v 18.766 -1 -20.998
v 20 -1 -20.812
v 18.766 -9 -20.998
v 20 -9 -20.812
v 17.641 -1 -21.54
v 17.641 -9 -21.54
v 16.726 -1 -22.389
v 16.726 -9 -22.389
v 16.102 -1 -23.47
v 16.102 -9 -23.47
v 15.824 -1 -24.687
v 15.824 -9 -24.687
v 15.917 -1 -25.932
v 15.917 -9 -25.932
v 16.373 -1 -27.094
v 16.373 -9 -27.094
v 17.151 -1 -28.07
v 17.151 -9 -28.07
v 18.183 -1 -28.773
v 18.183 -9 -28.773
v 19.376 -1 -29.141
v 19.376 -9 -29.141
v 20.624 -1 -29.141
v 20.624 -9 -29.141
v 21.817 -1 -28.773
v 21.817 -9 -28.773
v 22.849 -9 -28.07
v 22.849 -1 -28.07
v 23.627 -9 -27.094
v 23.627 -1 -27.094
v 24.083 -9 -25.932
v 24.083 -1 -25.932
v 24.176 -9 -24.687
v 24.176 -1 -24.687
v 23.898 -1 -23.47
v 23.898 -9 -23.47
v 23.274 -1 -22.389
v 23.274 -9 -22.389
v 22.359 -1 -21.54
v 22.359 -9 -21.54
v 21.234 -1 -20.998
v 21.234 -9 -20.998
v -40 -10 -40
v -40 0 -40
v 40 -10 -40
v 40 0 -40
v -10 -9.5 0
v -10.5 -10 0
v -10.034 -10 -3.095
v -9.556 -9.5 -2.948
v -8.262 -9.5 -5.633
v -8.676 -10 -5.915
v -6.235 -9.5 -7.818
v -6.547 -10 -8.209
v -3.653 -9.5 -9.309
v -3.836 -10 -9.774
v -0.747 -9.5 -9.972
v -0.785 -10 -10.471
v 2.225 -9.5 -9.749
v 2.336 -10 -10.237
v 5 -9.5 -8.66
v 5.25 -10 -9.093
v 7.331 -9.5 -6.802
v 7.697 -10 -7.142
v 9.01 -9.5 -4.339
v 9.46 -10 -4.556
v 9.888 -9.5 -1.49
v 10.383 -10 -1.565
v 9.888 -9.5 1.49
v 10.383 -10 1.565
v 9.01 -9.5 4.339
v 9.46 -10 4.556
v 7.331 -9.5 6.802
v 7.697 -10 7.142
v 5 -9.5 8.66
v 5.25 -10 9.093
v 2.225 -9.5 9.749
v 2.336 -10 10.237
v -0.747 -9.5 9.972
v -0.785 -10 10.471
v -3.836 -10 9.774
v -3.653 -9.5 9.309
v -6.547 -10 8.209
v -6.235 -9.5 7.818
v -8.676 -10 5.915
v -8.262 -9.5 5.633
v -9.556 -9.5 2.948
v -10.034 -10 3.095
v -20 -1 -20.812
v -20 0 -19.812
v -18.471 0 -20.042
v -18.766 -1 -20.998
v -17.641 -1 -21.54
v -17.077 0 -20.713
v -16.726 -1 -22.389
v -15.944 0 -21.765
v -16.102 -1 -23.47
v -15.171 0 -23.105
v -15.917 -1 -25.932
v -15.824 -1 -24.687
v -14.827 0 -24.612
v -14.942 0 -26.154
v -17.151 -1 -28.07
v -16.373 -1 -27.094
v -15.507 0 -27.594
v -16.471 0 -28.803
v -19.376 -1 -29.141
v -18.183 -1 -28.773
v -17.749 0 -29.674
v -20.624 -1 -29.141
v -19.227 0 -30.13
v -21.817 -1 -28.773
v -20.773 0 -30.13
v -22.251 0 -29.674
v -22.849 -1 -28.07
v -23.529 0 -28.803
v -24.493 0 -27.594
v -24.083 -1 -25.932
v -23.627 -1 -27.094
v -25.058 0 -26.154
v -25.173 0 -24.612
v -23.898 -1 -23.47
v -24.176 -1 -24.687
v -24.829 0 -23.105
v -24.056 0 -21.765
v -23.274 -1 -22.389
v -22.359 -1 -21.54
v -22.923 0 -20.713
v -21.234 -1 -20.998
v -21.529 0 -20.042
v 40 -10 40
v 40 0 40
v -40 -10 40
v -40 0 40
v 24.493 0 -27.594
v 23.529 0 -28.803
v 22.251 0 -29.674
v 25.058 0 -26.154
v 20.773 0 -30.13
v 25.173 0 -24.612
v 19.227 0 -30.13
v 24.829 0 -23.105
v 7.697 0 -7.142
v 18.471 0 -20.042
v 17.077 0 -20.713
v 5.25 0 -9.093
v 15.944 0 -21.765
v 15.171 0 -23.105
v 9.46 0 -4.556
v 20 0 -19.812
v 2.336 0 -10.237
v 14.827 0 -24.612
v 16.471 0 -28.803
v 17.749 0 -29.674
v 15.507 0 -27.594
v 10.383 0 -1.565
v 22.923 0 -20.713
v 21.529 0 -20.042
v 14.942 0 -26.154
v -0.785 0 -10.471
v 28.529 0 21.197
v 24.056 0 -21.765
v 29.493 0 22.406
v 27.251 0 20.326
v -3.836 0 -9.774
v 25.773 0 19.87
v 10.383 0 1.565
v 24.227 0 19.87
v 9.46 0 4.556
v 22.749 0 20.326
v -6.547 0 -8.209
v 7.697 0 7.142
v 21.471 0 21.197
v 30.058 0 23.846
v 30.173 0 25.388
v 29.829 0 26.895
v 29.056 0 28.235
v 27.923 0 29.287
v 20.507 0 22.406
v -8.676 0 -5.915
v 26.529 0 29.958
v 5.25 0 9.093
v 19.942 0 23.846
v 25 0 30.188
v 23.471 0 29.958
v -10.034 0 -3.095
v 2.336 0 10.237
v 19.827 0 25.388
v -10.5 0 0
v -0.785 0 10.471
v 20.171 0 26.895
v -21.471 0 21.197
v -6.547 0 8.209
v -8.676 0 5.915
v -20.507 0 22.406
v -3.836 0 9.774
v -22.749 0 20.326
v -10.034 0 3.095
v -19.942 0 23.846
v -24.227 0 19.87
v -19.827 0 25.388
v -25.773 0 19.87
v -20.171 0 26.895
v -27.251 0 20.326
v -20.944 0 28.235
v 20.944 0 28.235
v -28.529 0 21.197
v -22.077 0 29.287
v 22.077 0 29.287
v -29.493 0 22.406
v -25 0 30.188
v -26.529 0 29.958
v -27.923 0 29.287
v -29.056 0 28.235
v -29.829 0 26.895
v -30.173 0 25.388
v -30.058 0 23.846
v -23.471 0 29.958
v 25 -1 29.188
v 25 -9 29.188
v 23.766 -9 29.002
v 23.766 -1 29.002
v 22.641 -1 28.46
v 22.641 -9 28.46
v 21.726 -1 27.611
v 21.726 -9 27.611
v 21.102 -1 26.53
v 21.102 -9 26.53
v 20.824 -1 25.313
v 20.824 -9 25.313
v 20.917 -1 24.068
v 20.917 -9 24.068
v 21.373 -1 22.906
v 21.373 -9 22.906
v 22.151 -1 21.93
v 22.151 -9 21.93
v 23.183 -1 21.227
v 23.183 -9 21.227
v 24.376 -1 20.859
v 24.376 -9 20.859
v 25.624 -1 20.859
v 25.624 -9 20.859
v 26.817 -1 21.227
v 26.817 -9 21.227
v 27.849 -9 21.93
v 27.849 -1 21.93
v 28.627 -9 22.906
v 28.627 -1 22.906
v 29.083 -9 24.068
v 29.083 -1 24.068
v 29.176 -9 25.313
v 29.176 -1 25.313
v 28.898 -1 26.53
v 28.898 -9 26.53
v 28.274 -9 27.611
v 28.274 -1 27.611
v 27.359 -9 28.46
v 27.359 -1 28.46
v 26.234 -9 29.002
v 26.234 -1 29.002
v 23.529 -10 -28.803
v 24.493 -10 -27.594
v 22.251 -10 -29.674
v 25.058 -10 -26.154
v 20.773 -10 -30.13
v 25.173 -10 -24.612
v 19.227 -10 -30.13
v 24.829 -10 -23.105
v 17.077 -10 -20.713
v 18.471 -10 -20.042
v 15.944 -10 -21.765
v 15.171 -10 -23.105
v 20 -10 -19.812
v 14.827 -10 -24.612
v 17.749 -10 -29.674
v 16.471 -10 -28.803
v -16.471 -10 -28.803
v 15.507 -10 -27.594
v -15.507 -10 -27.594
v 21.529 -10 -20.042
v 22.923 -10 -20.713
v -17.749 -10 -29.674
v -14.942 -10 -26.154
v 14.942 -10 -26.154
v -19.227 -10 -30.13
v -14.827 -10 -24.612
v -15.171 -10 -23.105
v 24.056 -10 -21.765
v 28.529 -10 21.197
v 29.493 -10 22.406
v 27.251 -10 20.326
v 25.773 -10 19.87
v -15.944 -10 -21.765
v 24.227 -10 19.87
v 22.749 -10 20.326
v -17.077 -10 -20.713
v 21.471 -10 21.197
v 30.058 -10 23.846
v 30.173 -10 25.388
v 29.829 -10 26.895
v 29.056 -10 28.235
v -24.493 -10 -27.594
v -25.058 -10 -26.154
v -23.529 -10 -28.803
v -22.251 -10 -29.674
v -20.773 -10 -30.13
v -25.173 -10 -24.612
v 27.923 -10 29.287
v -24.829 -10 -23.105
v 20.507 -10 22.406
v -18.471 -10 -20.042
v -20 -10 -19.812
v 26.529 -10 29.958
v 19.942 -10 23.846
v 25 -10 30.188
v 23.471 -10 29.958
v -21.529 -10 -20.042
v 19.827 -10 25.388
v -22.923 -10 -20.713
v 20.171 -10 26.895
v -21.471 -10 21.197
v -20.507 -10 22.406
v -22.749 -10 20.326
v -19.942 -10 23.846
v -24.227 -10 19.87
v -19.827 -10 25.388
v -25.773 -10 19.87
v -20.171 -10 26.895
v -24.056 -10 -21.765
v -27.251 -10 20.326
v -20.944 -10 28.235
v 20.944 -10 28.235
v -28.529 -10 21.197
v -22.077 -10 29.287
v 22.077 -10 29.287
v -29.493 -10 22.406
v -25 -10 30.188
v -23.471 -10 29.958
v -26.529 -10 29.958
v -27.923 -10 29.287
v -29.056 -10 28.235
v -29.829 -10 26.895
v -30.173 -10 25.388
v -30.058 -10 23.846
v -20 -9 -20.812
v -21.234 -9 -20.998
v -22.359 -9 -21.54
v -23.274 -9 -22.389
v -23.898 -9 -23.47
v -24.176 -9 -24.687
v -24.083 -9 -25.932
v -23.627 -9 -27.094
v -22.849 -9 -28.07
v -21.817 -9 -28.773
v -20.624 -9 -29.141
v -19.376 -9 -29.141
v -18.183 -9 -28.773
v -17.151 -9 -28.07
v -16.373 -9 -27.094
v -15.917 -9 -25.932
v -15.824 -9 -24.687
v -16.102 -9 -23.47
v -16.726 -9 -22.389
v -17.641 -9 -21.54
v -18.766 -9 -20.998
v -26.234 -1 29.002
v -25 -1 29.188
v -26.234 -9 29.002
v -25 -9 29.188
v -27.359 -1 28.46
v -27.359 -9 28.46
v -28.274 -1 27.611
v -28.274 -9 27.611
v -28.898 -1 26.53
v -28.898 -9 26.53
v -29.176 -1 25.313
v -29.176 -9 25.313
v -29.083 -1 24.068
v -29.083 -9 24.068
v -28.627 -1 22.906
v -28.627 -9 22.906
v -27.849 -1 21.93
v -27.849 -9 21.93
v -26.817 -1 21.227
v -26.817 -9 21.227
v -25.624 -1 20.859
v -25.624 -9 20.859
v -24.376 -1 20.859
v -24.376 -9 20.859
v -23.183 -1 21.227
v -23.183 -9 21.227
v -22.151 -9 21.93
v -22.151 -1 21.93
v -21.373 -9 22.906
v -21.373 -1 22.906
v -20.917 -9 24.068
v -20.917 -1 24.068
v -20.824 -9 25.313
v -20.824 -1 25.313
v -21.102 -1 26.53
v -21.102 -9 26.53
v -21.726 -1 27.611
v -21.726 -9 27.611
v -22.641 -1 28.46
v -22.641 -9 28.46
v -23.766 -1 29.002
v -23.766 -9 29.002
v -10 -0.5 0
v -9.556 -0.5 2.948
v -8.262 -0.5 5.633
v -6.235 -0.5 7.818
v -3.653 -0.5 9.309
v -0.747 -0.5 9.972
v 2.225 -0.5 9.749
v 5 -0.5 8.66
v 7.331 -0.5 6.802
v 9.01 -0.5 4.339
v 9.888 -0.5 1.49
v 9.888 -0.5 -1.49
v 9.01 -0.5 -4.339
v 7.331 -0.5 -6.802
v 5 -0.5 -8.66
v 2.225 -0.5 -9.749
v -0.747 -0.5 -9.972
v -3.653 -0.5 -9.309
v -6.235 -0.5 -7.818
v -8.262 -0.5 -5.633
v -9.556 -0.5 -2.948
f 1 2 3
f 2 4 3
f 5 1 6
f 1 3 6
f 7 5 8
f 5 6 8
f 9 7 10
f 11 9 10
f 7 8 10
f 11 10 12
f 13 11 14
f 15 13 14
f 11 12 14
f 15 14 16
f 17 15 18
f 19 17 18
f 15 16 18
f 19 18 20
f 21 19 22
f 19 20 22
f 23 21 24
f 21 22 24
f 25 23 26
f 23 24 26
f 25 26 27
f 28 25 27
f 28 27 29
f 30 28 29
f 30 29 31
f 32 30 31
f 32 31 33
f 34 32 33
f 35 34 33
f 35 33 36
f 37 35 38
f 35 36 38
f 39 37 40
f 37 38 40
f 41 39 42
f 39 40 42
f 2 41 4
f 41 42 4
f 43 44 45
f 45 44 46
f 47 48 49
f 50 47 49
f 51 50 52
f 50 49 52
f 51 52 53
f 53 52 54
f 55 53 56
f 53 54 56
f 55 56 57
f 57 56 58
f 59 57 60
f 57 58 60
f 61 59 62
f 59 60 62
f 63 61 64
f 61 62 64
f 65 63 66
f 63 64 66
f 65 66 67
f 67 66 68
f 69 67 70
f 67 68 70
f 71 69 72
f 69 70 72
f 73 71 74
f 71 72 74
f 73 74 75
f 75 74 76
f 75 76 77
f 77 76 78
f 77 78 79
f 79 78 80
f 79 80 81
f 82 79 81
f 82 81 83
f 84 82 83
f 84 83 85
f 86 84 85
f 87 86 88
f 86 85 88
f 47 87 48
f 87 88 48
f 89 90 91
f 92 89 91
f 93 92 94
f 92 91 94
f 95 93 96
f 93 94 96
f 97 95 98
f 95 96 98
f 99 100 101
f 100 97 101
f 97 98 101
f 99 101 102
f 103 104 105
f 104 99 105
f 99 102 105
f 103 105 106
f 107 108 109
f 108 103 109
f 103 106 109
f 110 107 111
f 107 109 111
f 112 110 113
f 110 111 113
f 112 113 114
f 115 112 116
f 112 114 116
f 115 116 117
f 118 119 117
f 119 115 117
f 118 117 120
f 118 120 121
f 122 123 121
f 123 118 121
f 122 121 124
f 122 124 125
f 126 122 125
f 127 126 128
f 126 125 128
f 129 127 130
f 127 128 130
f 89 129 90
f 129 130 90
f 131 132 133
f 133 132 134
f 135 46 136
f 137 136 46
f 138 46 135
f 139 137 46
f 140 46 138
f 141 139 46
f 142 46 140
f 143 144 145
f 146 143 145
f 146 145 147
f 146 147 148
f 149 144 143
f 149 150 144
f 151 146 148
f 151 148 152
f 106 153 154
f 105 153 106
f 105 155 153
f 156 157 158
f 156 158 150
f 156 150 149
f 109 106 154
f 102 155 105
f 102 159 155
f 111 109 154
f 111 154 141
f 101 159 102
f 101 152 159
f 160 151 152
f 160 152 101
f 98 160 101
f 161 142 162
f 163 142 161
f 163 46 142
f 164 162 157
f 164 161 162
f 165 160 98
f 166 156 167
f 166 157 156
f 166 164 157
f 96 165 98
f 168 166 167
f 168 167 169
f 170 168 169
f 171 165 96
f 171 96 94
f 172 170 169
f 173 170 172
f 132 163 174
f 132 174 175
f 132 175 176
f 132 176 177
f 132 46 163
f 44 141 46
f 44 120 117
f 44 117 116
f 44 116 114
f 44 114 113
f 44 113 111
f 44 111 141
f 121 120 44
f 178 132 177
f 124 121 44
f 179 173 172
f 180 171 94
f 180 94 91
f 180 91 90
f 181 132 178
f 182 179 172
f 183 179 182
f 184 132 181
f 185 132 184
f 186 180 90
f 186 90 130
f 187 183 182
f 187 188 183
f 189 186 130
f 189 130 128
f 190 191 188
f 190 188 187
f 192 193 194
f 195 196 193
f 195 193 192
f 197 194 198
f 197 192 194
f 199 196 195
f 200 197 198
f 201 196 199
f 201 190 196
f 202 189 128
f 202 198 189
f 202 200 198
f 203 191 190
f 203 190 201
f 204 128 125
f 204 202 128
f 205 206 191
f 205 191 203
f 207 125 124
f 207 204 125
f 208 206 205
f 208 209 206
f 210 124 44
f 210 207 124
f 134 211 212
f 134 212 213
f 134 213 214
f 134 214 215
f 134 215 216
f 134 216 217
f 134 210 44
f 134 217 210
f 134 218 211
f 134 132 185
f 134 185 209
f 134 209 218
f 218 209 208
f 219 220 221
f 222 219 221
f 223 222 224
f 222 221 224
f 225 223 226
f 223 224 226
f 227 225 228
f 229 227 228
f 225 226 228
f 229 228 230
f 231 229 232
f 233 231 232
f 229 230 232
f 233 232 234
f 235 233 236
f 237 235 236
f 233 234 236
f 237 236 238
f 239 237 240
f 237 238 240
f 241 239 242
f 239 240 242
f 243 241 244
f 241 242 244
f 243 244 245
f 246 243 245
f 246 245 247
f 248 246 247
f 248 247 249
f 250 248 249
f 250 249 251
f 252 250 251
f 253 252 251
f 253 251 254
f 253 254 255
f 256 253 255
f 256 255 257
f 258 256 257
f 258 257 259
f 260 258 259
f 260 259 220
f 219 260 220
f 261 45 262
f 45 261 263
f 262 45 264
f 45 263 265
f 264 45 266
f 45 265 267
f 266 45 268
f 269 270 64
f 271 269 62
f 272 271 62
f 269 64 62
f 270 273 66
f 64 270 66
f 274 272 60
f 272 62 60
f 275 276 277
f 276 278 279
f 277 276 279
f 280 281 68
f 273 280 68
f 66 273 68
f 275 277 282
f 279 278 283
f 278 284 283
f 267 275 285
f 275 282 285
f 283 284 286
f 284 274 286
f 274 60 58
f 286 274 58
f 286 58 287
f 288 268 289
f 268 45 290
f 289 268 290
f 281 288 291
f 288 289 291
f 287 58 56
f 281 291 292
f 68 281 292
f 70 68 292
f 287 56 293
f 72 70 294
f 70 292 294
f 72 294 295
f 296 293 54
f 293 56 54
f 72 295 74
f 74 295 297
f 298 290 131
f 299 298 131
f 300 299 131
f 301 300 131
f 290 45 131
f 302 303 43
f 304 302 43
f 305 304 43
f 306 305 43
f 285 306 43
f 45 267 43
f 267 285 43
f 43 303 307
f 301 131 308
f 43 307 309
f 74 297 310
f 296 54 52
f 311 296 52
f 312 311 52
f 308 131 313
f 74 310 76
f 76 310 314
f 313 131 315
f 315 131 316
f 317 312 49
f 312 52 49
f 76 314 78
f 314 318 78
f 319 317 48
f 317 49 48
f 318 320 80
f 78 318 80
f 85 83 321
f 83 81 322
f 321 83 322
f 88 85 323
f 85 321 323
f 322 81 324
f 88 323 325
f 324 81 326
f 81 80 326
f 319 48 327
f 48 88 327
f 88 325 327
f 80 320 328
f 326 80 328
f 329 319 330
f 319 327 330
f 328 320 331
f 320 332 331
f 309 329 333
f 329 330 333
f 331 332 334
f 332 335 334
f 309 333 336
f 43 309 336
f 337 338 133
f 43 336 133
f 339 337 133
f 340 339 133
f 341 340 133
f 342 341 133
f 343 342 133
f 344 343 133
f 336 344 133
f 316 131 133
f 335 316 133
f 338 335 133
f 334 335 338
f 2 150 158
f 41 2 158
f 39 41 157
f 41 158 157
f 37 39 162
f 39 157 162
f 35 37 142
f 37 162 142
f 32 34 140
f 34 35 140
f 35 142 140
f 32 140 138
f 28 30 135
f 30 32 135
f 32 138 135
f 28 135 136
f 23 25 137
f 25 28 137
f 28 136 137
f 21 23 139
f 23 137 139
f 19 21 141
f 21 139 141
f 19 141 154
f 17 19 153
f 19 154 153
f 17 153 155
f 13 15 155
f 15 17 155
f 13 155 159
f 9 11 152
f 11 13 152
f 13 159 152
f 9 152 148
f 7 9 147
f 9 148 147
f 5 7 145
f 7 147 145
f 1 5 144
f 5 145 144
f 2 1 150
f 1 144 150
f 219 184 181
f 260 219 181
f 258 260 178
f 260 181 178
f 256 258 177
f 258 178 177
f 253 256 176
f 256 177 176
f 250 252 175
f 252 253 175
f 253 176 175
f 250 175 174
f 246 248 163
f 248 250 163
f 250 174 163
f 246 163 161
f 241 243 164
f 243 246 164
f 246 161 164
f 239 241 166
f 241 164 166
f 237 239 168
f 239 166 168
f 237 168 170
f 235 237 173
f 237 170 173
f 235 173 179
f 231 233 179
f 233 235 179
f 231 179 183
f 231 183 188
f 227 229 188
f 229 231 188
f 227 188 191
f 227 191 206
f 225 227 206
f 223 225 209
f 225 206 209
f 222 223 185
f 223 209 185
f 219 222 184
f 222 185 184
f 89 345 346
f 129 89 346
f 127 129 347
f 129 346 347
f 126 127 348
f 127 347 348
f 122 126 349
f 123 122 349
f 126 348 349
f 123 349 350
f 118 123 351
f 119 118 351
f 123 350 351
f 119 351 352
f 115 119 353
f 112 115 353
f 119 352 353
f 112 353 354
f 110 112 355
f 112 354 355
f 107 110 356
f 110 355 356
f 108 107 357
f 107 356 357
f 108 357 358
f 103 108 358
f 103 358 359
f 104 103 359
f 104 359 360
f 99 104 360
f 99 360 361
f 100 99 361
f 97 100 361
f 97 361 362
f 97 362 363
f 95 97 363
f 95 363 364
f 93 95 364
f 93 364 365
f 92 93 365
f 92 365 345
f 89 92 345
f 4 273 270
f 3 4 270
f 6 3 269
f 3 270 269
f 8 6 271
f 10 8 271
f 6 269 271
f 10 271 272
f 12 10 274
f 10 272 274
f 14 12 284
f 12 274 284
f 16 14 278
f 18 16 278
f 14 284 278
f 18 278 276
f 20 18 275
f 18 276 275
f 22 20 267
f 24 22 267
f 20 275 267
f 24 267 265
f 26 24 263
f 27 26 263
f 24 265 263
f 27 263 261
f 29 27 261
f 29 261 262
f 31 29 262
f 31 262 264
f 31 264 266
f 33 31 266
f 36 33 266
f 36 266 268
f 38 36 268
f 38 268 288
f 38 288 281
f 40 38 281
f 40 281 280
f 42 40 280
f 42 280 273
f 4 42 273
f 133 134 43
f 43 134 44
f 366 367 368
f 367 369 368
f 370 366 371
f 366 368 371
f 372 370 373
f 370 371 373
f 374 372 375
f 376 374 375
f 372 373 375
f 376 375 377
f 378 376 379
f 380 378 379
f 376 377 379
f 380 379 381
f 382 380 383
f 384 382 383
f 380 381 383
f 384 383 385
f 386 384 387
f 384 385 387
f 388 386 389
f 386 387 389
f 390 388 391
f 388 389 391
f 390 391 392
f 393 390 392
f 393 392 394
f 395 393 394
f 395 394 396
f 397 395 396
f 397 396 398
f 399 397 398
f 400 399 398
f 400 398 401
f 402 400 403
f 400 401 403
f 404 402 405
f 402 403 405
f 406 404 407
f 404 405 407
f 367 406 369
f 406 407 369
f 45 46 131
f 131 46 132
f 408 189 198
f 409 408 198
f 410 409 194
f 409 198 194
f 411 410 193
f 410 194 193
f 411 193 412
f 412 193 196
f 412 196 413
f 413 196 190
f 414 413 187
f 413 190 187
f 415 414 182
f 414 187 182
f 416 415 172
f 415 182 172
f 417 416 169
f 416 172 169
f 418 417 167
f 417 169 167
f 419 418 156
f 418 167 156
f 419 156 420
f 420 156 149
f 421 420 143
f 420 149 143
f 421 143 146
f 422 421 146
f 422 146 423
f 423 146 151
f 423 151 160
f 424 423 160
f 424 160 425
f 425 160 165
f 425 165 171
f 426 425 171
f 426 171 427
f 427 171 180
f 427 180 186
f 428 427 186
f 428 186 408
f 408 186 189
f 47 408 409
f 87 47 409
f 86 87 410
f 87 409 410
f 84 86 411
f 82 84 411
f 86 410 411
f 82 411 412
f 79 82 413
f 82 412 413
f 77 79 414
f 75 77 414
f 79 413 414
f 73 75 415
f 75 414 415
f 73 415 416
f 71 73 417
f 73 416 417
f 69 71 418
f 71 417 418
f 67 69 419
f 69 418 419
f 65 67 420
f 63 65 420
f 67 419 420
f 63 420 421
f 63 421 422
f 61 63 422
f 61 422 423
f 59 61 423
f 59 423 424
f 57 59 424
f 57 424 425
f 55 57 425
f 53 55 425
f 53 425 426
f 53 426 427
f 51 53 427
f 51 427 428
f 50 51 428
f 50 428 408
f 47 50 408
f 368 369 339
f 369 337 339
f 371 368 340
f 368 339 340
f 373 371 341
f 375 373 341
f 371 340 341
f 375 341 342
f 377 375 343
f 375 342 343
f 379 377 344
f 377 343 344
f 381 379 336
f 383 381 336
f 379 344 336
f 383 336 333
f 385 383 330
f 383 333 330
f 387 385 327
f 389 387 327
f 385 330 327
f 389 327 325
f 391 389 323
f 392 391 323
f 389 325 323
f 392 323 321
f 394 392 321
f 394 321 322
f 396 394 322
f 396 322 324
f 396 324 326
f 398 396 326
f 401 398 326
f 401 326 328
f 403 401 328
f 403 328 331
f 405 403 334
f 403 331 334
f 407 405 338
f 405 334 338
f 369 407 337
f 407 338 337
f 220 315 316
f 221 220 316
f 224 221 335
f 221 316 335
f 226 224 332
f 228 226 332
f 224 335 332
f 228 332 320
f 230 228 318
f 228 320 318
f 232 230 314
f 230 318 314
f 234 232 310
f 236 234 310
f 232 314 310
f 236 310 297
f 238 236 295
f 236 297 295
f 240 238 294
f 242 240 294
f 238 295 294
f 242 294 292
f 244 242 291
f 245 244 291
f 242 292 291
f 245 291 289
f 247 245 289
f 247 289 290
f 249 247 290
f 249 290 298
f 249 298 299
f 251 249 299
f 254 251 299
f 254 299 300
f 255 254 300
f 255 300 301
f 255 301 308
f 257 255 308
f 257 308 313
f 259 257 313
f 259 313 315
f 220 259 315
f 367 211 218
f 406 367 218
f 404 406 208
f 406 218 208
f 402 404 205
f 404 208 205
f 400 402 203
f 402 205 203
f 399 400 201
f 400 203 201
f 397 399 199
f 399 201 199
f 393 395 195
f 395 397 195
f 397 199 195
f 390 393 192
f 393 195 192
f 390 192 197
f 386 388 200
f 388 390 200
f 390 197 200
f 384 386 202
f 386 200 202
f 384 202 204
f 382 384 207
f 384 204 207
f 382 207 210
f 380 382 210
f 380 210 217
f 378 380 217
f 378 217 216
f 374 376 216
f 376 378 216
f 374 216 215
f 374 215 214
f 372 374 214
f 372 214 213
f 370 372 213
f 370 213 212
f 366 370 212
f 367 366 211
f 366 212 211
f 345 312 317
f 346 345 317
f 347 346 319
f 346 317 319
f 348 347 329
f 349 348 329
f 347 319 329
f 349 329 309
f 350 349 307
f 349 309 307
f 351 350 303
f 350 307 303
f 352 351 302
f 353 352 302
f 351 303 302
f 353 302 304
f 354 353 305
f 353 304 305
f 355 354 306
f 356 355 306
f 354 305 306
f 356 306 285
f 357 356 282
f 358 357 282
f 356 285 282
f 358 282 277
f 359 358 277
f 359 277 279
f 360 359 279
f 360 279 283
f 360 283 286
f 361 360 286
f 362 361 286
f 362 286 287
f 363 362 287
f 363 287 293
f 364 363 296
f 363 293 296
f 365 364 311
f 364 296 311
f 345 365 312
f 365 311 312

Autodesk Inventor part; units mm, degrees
ref_plane "YZ Plane" through (0, 0, 0) normal (1, 0, 0) x (0, 1, 0)
ref_plane "XZ Plane" through (0, 0, 0) normal (0, 1, 0) x (-1, 0, 0)
ref_plane "XY Plane" through (0, 0, 0) normal (0, 0, 1) x (1, 0, 0)
sketch "Sketch1" plane through (0, 0, 0) normal (0, 1, 0) x (-1, 0, 0)
  line L0 (-40, 40) -> (40, 40)
  line L1 (40, 40) -> (40, -40)
  line L2 (40, -40) -> (-40, -40)
  line L3 (-40, -40) -> (-40, 40)
  line L4 (-40, 40) -> (40, -40) construction
  line L5 (40, 40) -> (-40, -40) construction
  line L6 (-25, 25) -> (25, 25) construction
  line L7 (25, 25) -> (25, -25) construction
  line L8 (25, -25) -> (-25, -25) construction
  line L9 (-25, -25) -> (-25, 25) construction
  line L10 (-25, 25) -> (25, -25) construction
  line L11 (25, 25) -> (-25, -25) construction
  circle A0 centre (0, 0) radius 10
  line L12 (20, 25) -> (-20, 25)
  line L13 (-20, 25) -> (-20, -25) construction
  line L14 (-20, -25) -> (20, -25) construction
  line L15 (20, -25) -> (20, 25) construction
  line L16 (56, 0) -> (-56, 0) construction
  line L17 (0, -56) -> (0, 56) construction
  dimension "d0" = 80
  dimension "d1" = 50
  dimension "d2" = 20
  dimension "d12" = 40
extrude "Extrusion1" add sketch "Sketch1" against normal blind 10
hole "Hole1" at (-25, 0, 25) at (25, 0, 25) at (-20, 0, -25) at (20, 0, -25) direction (0, -1, 0) diameter 8.376 end through all thread size "M10x1.5" class "6H" standard "ISO Metric profile"
chamfer "Chamfer1" distance 1 angle 45 8 edges at (20, 0, -29.188) (-20, 0, -29.188) (25, 0, 20.812) (-25, 0, 20.812) (20, -10, -29.188) (-20, -10, -29.188) (25, -10, 20.812) (-25, -10, 20.812)
chamfer "Chamfer2" distance 0.5 angle 45 2 edges at (10, 0, 0) (10, -10, 0)
properties part number "AP1-001"
